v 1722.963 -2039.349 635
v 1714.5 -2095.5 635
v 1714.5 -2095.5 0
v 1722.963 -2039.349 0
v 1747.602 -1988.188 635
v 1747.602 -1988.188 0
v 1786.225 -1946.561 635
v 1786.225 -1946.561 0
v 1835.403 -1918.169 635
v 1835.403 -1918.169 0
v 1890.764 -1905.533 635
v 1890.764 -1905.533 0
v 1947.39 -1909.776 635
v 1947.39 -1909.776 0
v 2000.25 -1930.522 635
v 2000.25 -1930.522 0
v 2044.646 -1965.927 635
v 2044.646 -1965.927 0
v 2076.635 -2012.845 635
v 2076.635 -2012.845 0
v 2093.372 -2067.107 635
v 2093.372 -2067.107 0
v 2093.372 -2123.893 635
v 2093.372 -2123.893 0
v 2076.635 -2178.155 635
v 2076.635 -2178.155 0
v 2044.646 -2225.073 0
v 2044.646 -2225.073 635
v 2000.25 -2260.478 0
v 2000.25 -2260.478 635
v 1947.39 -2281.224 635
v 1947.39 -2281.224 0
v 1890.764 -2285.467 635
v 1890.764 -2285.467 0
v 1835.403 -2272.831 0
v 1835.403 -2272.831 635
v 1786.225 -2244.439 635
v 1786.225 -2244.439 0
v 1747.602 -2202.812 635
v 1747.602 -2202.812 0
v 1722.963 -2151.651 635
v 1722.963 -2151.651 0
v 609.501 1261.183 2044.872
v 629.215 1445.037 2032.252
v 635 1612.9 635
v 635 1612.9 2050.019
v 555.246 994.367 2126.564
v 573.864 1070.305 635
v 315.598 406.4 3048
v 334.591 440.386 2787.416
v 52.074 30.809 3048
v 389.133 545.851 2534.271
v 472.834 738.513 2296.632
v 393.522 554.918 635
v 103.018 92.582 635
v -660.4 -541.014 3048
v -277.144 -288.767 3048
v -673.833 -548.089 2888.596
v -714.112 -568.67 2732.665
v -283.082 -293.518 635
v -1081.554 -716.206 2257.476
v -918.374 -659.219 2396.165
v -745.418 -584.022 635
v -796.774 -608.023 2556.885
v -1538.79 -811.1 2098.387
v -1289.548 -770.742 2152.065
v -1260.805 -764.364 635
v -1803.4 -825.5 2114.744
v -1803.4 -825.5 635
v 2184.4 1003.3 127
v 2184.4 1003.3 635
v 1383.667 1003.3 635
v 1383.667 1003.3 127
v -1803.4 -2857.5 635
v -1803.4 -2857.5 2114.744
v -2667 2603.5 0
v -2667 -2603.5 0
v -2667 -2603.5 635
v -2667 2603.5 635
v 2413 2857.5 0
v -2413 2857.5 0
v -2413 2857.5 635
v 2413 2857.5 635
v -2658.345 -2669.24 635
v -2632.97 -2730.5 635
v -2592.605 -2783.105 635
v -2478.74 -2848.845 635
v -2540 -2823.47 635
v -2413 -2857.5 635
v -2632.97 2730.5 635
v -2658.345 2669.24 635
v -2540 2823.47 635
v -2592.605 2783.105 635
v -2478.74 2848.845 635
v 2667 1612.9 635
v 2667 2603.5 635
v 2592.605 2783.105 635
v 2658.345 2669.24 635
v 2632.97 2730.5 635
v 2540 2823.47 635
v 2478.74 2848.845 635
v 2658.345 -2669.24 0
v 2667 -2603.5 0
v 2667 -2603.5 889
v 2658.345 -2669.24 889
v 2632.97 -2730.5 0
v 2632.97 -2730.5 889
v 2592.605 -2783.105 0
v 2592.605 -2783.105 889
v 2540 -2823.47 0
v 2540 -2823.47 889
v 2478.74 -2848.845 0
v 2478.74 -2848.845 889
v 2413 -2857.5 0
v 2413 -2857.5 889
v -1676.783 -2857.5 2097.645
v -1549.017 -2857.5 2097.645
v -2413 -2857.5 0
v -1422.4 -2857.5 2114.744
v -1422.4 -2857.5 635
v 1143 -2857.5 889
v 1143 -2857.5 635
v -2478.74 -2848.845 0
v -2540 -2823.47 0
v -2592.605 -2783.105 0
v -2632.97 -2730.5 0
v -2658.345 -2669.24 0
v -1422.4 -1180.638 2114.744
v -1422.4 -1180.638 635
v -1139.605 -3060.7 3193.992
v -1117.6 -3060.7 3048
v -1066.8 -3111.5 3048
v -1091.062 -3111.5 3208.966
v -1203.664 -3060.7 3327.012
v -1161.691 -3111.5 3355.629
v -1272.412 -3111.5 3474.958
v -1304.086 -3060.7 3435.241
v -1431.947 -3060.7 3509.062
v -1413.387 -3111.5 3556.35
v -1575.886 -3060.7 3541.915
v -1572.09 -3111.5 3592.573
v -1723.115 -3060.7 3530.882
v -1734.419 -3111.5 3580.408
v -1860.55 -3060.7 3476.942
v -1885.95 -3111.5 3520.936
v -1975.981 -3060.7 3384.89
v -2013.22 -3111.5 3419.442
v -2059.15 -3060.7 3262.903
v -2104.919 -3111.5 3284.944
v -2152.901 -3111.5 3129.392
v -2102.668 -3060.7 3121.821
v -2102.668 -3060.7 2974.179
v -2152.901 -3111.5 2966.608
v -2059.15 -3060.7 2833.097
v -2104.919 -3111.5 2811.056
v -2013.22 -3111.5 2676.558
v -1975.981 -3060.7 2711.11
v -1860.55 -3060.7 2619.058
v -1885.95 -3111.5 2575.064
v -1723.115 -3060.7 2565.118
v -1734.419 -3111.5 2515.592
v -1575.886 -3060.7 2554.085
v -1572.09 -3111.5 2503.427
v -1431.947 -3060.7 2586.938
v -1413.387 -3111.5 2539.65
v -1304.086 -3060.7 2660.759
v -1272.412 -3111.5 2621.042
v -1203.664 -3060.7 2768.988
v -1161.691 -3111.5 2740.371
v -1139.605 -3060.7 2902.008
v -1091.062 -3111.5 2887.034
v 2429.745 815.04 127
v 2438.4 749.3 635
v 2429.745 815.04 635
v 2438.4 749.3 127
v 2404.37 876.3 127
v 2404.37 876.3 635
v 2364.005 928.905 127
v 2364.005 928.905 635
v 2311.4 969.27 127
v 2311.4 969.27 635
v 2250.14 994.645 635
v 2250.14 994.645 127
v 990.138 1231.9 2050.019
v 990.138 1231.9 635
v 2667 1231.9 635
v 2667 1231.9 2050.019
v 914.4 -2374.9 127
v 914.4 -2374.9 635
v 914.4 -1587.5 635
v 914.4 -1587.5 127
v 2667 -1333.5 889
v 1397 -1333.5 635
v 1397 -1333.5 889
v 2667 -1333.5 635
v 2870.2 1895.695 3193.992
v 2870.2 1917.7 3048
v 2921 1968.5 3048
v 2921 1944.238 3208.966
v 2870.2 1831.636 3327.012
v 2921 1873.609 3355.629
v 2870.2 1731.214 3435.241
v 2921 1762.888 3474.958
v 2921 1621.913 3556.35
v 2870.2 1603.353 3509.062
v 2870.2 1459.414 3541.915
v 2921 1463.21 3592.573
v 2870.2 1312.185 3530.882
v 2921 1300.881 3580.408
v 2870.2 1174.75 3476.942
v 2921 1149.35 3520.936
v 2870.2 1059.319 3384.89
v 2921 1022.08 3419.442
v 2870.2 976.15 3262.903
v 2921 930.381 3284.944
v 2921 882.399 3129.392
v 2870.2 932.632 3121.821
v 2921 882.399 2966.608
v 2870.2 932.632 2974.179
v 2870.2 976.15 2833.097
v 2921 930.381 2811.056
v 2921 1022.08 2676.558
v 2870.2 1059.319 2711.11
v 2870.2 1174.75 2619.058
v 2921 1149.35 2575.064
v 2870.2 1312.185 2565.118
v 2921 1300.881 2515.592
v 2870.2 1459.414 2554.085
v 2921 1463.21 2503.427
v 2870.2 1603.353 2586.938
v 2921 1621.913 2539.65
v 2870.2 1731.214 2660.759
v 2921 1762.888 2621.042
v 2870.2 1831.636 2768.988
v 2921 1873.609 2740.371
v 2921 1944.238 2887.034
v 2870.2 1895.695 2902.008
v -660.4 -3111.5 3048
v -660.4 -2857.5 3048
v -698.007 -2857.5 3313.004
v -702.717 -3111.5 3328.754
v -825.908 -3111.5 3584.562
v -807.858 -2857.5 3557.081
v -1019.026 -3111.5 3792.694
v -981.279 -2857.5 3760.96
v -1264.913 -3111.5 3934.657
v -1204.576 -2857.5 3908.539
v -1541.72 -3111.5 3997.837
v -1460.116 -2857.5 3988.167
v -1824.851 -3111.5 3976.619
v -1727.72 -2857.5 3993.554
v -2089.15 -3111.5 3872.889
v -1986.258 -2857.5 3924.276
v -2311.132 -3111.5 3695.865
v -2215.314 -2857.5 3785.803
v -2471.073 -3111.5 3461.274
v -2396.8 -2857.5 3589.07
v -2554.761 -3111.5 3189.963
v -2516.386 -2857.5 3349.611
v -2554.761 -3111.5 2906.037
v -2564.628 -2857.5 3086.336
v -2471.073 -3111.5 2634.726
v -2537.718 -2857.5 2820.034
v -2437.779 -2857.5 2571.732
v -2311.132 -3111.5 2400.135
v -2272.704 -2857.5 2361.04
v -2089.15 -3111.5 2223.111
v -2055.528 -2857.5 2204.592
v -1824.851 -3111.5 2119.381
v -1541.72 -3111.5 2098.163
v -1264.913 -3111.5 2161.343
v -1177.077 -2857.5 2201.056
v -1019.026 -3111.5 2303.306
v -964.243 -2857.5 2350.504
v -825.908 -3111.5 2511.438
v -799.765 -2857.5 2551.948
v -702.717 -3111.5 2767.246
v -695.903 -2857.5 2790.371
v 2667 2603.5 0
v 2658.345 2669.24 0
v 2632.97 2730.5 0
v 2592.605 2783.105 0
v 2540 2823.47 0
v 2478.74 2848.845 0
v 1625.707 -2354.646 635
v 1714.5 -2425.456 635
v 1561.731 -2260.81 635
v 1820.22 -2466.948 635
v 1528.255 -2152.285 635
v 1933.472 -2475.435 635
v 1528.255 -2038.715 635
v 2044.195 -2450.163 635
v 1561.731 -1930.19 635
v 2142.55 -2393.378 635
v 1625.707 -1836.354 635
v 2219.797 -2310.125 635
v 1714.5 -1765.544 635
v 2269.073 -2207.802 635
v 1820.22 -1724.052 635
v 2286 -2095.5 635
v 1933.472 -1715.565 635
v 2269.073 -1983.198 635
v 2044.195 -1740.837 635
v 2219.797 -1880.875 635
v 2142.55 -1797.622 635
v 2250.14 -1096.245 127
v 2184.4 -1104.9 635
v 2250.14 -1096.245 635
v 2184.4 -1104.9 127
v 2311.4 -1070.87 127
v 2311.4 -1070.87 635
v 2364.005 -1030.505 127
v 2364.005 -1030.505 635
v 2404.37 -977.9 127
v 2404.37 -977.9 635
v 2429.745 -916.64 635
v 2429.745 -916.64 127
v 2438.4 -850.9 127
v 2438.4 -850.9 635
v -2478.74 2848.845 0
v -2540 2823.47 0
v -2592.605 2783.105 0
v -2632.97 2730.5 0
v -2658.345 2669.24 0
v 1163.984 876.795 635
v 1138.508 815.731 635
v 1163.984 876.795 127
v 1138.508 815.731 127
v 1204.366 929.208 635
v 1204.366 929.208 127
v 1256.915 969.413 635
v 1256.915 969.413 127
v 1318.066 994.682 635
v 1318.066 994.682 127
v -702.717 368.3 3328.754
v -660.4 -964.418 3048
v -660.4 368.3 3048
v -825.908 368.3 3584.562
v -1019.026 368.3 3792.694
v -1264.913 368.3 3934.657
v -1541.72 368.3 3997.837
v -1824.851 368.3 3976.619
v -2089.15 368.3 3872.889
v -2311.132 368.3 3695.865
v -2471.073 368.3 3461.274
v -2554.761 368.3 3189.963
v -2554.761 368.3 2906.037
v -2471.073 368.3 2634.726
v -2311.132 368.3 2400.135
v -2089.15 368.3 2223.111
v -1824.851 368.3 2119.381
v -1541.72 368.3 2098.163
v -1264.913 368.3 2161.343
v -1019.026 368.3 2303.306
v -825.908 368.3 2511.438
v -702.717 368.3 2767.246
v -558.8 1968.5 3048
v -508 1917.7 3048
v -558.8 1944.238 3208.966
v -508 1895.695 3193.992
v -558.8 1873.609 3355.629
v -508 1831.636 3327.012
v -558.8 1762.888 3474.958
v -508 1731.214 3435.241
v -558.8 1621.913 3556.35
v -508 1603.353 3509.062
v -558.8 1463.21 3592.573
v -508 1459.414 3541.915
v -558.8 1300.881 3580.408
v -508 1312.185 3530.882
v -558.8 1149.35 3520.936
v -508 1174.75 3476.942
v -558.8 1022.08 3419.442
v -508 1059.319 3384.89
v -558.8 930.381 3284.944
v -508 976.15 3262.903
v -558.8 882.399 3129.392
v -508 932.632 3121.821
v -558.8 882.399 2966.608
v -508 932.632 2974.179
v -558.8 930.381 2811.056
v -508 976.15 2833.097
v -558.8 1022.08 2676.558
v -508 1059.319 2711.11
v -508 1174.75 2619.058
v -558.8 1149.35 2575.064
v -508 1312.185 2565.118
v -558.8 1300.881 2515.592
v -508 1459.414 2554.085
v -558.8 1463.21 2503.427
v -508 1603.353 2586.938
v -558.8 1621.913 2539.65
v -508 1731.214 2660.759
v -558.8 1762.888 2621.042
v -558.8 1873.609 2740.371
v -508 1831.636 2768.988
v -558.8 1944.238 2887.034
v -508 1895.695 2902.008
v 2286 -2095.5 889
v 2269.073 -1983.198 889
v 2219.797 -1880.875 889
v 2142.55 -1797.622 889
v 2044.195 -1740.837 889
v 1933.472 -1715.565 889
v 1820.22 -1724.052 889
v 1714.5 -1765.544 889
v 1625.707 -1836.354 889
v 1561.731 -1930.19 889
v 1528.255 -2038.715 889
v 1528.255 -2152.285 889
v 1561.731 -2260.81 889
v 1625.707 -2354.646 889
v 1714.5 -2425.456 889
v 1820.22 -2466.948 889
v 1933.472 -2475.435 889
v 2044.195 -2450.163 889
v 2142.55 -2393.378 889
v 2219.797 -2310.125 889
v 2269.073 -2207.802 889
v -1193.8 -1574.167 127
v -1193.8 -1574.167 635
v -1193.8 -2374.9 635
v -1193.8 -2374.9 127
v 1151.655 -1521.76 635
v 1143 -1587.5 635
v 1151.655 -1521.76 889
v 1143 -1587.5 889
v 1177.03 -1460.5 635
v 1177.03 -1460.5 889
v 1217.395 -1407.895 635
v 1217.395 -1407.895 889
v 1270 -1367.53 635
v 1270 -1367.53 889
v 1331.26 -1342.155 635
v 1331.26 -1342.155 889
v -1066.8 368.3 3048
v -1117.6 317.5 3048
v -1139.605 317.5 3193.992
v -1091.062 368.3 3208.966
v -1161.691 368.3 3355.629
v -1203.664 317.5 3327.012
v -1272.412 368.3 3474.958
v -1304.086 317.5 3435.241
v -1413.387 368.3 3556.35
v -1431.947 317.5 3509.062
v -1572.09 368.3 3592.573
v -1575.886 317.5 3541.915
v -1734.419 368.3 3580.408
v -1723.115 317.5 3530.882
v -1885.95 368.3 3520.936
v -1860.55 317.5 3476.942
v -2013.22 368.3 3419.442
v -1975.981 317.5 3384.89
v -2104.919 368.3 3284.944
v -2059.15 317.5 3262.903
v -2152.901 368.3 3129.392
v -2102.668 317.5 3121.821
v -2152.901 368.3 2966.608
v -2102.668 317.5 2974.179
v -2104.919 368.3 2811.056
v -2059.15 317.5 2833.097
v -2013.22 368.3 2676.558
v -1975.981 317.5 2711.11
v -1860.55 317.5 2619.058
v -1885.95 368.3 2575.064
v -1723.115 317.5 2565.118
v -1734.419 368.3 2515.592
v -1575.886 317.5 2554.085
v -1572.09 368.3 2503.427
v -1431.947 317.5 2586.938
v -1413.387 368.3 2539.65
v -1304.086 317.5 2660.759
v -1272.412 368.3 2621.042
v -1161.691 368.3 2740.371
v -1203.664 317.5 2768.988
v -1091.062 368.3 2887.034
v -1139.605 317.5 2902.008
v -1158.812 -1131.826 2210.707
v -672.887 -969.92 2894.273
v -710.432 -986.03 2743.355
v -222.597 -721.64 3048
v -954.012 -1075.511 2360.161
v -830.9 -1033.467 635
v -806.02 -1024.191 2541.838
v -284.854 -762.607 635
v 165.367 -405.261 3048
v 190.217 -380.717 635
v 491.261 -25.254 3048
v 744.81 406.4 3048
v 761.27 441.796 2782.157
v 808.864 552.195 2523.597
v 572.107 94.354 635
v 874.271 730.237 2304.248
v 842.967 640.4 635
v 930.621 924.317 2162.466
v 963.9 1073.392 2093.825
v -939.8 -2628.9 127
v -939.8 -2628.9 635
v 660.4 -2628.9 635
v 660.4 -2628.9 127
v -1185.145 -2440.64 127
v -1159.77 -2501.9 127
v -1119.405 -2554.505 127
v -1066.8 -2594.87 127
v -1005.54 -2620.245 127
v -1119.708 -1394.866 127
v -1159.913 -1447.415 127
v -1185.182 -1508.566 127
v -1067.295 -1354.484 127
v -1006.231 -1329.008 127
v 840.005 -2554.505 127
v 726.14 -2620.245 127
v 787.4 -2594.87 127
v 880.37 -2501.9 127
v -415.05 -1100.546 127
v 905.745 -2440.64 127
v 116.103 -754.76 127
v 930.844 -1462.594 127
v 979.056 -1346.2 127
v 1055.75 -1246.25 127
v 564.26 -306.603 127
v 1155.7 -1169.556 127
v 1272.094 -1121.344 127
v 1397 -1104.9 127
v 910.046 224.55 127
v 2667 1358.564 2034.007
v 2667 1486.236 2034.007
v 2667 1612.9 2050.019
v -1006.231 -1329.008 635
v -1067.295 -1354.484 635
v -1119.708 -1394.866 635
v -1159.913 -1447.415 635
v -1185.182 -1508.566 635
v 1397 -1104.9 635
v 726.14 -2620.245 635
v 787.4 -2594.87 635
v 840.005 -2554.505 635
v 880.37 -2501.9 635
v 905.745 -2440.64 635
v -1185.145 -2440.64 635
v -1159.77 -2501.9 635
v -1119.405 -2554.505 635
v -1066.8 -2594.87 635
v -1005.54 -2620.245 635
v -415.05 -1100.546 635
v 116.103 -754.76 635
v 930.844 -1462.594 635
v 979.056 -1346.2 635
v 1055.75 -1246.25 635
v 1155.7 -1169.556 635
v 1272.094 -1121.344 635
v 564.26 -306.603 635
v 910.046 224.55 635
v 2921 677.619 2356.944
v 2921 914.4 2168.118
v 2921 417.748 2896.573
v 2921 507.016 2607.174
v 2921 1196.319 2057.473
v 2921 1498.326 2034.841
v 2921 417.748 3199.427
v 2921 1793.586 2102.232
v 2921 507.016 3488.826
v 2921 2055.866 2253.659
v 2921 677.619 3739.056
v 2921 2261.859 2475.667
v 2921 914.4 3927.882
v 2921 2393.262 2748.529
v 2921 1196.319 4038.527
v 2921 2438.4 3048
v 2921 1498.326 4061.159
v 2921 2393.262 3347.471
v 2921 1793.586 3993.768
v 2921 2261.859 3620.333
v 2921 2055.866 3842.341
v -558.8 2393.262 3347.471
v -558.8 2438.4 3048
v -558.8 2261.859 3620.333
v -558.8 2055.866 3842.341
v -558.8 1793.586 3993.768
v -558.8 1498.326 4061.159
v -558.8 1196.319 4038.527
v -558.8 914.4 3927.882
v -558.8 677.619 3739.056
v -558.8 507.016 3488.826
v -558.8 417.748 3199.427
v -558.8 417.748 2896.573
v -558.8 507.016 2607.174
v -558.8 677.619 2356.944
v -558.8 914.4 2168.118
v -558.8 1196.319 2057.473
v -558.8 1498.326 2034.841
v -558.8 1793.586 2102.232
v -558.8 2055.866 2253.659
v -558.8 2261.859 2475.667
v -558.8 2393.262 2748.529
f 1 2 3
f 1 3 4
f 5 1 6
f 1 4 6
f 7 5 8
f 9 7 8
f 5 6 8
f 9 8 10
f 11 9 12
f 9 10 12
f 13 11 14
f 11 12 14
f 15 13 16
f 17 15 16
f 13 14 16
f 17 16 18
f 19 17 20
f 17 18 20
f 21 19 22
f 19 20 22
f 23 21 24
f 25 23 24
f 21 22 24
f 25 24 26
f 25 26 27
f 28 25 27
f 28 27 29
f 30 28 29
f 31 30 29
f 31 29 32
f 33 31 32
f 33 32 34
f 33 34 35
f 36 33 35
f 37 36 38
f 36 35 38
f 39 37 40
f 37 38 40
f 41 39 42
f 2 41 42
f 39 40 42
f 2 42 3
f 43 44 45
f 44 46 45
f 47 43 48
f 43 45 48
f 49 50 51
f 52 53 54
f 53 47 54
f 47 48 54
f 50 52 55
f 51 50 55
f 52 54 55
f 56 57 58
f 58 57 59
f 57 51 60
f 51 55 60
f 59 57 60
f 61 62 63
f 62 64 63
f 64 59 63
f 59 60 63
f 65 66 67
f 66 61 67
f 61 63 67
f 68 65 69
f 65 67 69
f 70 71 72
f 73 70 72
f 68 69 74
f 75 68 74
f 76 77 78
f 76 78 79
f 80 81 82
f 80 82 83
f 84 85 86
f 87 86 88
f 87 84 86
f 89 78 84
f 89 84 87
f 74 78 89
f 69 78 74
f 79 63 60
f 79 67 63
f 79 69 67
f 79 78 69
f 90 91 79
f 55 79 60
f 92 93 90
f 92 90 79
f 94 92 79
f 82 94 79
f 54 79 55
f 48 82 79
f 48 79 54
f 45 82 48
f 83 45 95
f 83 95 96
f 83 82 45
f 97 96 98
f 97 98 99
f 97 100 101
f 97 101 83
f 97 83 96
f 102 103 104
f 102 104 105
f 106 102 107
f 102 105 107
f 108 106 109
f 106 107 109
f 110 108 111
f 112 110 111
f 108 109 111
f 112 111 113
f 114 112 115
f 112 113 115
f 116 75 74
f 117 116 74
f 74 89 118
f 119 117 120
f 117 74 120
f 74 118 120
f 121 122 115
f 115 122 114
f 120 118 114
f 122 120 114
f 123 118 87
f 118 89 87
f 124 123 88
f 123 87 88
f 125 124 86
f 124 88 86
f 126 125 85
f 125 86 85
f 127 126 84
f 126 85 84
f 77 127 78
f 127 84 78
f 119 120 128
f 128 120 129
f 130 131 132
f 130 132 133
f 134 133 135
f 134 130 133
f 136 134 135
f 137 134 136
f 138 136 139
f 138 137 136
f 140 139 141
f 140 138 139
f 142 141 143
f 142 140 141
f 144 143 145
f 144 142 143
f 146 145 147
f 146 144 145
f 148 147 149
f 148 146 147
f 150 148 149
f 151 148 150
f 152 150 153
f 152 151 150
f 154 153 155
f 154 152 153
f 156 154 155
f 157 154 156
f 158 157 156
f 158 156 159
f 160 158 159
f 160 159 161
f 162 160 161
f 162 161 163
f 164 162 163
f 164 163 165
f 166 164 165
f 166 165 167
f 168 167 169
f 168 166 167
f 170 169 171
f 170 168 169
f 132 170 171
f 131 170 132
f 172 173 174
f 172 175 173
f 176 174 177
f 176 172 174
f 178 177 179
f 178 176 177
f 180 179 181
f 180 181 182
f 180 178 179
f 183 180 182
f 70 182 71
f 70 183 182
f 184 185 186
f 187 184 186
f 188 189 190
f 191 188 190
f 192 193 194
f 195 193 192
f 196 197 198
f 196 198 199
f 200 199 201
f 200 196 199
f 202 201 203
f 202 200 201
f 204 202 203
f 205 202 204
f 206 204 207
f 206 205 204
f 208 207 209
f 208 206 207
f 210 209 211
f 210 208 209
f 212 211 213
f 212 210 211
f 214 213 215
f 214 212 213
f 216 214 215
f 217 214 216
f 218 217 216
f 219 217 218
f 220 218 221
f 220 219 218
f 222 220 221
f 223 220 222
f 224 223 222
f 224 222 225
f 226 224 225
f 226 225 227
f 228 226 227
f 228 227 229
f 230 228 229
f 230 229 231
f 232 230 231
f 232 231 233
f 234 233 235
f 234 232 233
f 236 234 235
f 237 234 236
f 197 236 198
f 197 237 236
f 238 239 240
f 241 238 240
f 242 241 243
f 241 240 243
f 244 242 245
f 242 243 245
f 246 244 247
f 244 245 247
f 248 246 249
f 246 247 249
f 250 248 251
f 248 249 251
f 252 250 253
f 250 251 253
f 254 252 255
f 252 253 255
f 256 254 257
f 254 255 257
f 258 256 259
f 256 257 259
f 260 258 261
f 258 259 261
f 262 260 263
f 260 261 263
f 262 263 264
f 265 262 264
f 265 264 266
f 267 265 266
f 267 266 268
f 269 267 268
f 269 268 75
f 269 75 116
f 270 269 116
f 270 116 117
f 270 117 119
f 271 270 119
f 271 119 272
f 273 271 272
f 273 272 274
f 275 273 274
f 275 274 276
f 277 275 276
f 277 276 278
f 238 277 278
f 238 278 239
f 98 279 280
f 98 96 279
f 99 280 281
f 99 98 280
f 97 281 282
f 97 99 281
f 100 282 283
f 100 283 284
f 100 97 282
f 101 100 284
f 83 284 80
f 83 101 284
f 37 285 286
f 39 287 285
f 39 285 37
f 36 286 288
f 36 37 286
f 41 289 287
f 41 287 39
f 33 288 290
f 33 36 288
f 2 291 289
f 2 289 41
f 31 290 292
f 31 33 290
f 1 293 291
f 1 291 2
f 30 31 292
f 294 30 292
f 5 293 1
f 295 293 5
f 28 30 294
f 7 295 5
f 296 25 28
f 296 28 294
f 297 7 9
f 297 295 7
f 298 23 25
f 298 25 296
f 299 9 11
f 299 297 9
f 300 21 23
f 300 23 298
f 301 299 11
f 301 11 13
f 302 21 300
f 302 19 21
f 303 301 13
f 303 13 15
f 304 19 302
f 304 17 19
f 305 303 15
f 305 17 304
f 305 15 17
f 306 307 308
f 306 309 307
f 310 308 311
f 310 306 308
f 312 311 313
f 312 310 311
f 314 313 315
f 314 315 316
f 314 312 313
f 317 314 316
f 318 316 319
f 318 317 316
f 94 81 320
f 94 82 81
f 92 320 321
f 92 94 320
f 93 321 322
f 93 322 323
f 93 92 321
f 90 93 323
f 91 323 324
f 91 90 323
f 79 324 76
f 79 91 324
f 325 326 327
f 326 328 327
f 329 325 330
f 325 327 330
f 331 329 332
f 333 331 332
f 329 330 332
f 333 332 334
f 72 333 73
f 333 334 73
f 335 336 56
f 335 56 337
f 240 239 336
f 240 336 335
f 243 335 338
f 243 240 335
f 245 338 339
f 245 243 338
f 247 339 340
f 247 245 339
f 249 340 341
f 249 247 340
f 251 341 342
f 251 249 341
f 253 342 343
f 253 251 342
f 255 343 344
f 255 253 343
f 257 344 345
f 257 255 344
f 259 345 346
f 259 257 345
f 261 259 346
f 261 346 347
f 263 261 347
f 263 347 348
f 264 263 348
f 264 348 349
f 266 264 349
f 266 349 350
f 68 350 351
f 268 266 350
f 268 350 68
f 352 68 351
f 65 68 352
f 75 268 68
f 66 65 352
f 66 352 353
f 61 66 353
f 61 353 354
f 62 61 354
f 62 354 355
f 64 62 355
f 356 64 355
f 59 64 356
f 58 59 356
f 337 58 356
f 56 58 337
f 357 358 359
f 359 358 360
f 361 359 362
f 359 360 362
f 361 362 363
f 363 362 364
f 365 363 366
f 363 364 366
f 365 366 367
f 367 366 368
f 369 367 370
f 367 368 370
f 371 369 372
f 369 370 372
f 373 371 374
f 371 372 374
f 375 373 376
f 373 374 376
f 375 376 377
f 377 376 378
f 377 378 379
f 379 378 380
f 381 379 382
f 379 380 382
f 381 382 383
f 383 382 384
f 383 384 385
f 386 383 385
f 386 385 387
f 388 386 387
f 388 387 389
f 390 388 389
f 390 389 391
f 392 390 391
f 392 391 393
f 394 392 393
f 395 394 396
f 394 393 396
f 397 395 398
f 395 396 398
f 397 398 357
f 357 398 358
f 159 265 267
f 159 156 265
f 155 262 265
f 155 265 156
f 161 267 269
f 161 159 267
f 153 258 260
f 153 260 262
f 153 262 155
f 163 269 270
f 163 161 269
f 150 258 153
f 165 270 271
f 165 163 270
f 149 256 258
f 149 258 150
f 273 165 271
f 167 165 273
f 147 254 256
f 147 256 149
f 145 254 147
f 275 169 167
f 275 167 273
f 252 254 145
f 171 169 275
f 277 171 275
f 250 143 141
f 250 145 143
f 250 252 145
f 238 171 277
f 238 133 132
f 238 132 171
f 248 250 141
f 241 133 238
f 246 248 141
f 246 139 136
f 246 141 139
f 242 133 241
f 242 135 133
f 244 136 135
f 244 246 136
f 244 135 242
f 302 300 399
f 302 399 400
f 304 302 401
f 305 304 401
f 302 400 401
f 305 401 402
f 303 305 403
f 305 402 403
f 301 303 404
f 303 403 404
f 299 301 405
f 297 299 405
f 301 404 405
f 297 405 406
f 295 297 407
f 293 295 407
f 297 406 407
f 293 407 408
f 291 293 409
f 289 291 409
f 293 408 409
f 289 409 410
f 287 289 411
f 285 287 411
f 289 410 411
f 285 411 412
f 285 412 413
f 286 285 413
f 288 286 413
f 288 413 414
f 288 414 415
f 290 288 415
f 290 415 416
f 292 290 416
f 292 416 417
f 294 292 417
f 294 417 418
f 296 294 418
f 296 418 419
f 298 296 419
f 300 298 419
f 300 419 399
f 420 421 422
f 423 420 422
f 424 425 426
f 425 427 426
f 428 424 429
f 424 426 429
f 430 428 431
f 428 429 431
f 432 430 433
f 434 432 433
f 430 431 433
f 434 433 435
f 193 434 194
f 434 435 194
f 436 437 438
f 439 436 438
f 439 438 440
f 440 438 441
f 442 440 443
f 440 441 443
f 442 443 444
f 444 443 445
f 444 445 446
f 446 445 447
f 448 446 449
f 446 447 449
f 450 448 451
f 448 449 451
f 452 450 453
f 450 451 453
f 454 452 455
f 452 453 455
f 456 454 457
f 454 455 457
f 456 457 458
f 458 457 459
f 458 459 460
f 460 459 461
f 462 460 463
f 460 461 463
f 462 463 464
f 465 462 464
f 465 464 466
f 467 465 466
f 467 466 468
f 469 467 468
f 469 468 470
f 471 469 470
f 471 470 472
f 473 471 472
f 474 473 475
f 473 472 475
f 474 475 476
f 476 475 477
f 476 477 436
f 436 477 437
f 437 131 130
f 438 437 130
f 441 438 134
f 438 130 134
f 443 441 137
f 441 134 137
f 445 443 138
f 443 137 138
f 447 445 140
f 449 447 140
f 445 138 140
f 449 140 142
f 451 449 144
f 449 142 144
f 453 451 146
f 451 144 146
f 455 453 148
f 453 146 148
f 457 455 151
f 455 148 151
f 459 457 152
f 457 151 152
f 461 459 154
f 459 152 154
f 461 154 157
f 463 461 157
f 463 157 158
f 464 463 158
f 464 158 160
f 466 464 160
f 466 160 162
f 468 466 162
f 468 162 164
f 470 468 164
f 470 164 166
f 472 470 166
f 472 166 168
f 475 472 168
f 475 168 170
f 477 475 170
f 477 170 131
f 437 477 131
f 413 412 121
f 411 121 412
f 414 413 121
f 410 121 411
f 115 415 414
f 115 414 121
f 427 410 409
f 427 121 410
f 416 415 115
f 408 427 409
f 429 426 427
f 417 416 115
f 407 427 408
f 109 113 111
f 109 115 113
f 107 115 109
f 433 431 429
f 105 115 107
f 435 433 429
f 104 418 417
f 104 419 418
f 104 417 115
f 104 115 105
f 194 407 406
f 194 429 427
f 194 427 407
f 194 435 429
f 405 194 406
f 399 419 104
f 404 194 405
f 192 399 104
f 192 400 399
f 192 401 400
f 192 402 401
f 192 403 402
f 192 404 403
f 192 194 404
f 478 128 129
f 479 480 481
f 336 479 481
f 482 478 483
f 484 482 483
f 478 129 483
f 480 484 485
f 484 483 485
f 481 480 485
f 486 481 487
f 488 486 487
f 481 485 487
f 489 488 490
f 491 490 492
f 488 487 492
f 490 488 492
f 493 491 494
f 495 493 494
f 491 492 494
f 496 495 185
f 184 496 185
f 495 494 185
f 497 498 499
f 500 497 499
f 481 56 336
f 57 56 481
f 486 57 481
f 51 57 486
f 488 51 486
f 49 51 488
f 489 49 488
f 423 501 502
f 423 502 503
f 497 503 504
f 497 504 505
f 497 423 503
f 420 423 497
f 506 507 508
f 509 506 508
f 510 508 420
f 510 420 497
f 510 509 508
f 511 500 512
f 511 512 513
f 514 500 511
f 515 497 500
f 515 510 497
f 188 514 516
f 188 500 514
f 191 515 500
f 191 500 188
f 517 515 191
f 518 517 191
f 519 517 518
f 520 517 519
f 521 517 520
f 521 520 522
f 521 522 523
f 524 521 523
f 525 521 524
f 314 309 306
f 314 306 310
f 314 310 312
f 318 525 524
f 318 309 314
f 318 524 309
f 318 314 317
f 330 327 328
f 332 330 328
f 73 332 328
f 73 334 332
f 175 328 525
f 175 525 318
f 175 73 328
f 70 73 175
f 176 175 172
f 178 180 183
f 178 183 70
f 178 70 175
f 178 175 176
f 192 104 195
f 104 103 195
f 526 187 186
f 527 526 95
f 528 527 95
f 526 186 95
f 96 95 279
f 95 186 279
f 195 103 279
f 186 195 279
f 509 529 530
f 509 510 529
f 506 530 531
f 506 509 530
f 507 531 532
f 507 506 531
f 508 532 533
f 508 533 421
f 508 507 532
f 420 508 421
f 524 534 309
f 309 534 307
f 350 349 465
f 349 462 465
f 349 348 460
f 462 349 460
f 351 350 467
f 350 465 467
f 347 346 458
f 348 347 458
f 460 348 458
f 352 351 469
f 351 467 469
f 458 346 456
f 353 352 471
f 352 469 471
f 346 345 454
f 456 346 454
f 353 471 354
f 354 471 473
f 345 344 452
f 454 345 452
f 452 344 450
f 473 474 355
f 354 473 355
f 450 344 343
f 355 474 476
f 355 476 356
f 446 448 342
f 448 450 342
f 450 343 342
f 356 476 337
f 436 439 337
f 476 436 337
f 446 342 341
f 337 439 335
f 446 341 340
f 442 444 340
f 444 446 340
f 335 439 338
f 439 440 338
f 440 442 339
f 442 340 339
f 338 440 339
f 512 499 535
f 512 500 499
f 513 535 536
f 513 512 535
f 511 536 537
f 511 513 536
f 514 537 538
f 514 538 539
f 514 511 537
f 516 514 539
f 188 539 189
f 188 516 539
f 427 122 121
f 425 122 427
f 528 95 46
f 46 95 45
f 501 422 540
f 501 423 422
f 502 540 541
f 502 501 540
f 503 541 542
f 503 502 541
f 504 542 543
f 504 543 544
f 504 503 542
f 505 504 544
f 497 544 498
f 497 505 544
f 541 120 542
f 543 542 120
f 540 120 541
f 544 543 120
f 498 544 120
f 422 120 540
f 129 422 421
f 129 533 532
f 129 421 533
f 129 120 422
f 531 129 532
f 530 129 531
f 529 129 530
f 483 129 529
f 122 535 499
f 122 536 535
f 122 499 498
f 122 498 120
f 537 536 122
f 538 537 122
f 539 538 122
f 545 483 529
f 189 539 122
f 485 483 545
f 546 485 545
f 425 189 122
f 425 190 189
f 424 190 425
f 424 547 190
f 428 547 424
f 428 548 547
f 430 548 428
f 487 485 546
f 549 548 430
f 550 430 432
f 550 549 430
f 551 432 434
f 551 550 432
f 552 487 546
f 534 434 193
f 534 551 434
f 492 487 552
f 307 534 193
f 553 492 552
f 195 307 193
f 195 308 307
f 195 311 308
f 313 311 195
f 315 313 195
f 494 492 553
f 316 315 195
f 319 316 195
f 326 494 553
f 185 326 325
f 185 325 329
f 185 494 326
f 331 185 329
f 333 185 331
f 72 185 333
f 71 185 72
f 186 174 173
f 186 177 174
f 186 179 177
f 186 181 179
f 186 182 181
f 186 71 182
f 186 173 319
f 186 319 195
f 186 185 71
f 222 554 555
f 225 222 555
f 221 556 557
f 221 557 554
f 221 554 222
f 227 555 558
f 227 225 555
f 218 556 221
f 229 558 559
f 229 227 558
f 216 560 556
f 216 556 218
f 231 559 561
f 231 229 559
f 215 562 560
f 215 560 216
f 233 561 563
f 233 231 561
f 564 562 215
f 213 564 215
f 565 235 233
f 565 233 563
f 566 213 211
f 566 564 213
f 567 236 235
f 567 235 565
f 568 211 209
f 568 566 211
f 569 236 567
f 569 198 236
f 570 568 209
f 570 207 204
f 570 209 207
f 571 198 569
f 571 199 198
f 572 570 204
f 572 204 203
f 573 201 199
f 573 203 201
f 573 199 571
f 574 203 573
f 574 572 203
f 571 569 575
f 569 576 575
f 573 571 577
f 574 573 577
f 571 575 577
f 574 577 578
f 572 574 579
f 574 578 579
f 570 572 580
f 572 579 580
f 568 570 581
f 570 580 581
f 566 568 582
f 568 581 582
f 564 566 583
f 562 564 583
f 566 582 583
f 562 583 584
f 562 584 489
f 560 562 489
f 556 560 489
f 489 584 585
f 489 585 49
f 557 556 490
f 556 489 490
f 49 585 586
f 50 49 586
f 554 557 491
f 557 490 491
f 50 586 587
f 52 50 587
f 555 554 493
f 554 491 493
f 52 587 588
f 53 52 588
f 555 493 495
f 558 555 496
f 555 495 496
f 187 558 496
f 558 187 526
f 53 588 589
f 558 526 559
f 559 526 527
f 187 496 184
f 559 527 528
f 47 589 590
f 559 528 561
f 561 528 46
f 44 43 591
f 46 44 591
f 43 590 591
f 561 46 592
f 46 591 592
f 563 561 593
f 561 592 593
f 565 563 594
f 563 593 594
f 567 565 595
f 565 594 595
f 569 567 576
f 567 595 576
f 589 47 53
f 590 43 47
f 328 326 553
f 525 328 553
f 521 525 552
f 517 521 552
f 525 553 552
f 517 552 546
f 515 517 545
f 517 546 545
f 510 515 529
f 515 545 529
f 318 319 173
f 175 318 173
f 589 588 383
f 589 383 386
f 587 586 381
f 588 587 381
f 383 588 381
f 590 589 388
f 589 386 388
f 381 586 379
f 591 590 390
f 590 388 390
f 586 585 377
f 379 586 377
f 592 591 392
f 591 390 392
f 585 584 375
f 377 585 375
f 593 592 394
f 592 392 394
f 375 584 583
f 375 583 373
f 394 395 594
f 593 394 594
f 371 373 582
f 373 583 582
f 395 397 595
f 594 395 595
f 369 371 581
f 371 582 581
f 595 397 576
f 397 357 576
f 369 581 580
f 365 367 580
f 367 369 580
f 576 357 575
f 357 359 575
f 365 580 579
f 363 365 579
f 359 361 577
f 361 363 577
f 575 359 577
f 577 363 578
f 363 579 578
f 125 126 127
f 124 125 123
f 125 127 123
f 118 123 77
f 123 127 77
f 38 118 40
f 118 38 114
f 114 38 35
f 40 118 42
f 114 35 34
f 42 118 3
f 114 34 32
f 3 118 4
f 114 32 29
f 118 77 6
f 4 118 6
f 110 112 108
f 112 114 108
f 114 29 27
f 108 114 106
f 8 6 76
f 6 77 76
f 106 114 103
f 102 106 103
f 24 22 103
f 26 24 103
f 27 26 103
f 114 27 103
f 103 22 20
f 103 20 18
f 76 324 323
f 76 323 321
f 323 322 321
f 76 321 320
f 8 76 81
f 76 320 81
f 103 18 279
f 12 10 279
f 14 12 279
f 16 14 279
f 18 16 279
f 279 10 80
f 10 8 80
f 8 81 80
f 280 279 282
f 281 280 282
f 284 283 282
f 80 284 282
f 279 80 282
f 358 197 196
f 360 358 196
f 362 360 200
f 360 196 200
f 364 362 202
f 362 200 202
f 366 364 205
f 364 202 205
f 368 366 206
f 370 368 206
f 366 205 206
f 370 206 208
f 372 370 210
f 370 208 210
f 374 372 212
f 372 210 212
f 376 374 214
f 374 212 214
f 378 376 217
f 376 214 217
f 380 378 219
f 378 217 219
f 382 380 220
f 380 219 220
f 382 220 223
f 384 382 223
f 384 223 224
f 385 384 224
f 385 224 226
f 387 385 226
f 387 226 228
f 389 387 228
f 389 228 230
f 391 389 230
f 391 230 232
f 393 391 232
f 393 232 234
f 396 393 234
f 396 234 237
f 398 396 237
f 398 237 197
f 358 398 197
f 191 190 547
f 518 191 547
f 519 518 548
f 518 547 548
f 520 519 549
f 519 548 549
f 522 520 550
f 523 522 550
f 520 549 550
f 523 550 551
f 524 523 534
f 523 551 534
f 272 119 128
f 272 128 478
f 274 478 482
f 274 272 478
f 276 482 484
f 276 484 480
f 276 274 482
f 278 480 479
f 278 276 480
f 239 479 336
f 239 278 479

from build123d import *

# Parameters (mm, degrees)
F0_W            = 5334
F0_H            = 5715
F1_DEPTH        = 635
F3_DEPTH        = 2413
F4_R            = 952.5
F5_DEPTH        = 254
F5_DEPTH_BACK   = 3225.8
F6_R            = 1016
F7_DEPTH        = 254
F7_DEPTH_BACK   = 3225.8
F8_W            = 1524
F8_H            = 1524
F9_DEPTH        = 254
F10_R           = 254
F12_DEPTH       = 508
F14_D           = 381
F14_CBORE_D     = 762
F14_CBORE_DEPTH = 254
F15_R           = 254
F16_R           = 495.3
F17_DEPTH       = 5969.001
F18_R           = 495.3
F19_DEPTH       = 5588.001
F20_SIZE        = 50.8
F21_R           = 254


with BuildPart() as f1:
    # F0 (on Top) → F1 (new body)
    with BuildSketch(Plane.XY):
        Rectangle(F0_W, F0_H)
    extrude(amount=F1_DEPTH)

    # F2 (on face) → F3 (join)
    with BuildSketch(Plane.XY.offset(635)):
        with BuildLine():
            Line((-1803.4, -825.5), (-1803.4, -2857.5))
            Line((-1803.4, -2857.5), (-1422.4, -2857.5))
            Line((-1422.4, -2857.5), (-1422.4, -1180.638144))
            ThreePointArc((-1422.4, -1180.638144), (190.216859, -380.716859), (990.138144, 1231.9))
            Line((990.138144, 1231.9), (2667, 1231.9))
            Line((2667, 1231.9), (2667, 1612.9))
            Line((2667, 1612.9), (635, 1612.9))
            ThreePointArc((635, 1612.9), (-79.190825, -111.309175), (-1803.4, -825.5))
        make_face()
    extrude(amount=F3_DEPTH)

    # F4 (on face) → F5 (join, two sides)
    with BuildSketch(Plane.XZ.offset(2857.5)) as f5_sk:
        with Locations((-1612.9, 3048)):
            Circle(F4_R)
    extrude(amount=F5_DEPTH)
    extrude(f5_sk.sketch, amount=-F5_DEPTH_BACK)

    # F6 (on face) → F7 (join, two sides)
    with BuildSketch(Plane.YZ.offset(2667)) as f7_sk:
        with Locations((1422.4, 3048)):
            Circle(F6_R)
    extrude(amount=F7_DEPTH)
    extrude(f7_sk.sketch, amount=-F7_DEPTH_BACK)

    # F8 (on face) → F9 (join)
    with BuildSketch(Plane.XY.offset(635)):
        with Locations((1905, -2095.5)):
            Rectangle(F8_W, F8_H)
    extrude(amount=F9_DEPTH)

    # F10
    f10_edges = [f1.edges().sort_by_distance(p)[0] for p in [
        (1143, -1333.5, 762),
    ]]
    fillet(f10_edges, radius=F10_R)

    # F11 (on face) → F12 (cut)
    with BuildSketch(Plane.XY.offset(635)):
        with BuildLine():
            ThreePointArc((1183.017894, 1003.3), (351.861469, -542.361469), (-1193.8, -1373.517894))
            Line((-1193.8, -1373.517894), (-1193.8, -2628.9))
            Line((-1193.8, -2628.9), (914.4, -2628.9))
            Line((914.4, -2628.9), (914.4, -1587.5))
            ThreePointArc((914.4, -1587.5), (1055.750267, -1246.250267), (1397, -1104.9))
            Line((1397, -1104.9), (2438.4, -1104.9))
            Line((2438.4, -1104.9), (2438.4, 1003.3))
            Line((2438.4, 1003.3), (1183.017894, 1003.3))
        make_face()
    extrude(amount=-F12_DEPTH, mode=Mode.SUBTRACT)

    # F14 (through all)
    with Locations(Plane.XY.offset(889)):
        with Locations((1905, -2095.5)):
            CounterBoreHole(F14_D / 2, F14_CBORE_D / 2, F14_CBORE_DEPTH)

    # F15
    f15_edges = [f1.edges().sort_by_distance(p)[0] for p in [
        (1183.017894, 1003.3, 381),
        (-1193.8, -1373.517894, 381),
        (2438.4, 1003.3, 381),
        (-1193.8, -2628.9, 381),
        (2438.4, -1104.9, 381),
        (914.4, -2628.9, 381),
    ]]
    fillet(f15_edges, radius=F15_R)

    # F16 (on face) → F17 (cut, through all)
    with BuildSketch(Plane.XZ.offset(3111.5)):
        with Locations((-1612.9, 3048)):
            Circle(F16_R)
    extrude(amount=-F17_DEPTH, mode=Mode.SUBTRACT)

    # F18 (on face) → F19 (cut, through all)
    with BuildSketch(Plane.YZ.offset(2921)):
        with Locations((1422.4, 3048)):
            Circle(F18_R)
    extrude(amount=-F19_DEPTH, mode=Mode.SUBTRACT)

    # F20
    f20_edges = [f1.edges().sort_by_distance(p)[0] for p in [
        (2921, 927.1, 3048),
        (-2108.2, -3111.5, 3048),
        (-2108.2, 368.3, 3048),
        (-558.8, 927.1, 3048),
    ]]
    chamfer(f20_edges, length=F20_SIZE)

    # F21
    f21_edges = [f1.edges().sort_by_distance(p)[0] for p in [
        (-2667, -2857.5, 317.5),
        (2667, -2857.5, 444.5),
        (2667, 2857.5, 317.5),
        (-2667, 2857.5, 317.5),
    ]]
    fillet(f21_edges, radius=F21_R)


solid = f1.part
